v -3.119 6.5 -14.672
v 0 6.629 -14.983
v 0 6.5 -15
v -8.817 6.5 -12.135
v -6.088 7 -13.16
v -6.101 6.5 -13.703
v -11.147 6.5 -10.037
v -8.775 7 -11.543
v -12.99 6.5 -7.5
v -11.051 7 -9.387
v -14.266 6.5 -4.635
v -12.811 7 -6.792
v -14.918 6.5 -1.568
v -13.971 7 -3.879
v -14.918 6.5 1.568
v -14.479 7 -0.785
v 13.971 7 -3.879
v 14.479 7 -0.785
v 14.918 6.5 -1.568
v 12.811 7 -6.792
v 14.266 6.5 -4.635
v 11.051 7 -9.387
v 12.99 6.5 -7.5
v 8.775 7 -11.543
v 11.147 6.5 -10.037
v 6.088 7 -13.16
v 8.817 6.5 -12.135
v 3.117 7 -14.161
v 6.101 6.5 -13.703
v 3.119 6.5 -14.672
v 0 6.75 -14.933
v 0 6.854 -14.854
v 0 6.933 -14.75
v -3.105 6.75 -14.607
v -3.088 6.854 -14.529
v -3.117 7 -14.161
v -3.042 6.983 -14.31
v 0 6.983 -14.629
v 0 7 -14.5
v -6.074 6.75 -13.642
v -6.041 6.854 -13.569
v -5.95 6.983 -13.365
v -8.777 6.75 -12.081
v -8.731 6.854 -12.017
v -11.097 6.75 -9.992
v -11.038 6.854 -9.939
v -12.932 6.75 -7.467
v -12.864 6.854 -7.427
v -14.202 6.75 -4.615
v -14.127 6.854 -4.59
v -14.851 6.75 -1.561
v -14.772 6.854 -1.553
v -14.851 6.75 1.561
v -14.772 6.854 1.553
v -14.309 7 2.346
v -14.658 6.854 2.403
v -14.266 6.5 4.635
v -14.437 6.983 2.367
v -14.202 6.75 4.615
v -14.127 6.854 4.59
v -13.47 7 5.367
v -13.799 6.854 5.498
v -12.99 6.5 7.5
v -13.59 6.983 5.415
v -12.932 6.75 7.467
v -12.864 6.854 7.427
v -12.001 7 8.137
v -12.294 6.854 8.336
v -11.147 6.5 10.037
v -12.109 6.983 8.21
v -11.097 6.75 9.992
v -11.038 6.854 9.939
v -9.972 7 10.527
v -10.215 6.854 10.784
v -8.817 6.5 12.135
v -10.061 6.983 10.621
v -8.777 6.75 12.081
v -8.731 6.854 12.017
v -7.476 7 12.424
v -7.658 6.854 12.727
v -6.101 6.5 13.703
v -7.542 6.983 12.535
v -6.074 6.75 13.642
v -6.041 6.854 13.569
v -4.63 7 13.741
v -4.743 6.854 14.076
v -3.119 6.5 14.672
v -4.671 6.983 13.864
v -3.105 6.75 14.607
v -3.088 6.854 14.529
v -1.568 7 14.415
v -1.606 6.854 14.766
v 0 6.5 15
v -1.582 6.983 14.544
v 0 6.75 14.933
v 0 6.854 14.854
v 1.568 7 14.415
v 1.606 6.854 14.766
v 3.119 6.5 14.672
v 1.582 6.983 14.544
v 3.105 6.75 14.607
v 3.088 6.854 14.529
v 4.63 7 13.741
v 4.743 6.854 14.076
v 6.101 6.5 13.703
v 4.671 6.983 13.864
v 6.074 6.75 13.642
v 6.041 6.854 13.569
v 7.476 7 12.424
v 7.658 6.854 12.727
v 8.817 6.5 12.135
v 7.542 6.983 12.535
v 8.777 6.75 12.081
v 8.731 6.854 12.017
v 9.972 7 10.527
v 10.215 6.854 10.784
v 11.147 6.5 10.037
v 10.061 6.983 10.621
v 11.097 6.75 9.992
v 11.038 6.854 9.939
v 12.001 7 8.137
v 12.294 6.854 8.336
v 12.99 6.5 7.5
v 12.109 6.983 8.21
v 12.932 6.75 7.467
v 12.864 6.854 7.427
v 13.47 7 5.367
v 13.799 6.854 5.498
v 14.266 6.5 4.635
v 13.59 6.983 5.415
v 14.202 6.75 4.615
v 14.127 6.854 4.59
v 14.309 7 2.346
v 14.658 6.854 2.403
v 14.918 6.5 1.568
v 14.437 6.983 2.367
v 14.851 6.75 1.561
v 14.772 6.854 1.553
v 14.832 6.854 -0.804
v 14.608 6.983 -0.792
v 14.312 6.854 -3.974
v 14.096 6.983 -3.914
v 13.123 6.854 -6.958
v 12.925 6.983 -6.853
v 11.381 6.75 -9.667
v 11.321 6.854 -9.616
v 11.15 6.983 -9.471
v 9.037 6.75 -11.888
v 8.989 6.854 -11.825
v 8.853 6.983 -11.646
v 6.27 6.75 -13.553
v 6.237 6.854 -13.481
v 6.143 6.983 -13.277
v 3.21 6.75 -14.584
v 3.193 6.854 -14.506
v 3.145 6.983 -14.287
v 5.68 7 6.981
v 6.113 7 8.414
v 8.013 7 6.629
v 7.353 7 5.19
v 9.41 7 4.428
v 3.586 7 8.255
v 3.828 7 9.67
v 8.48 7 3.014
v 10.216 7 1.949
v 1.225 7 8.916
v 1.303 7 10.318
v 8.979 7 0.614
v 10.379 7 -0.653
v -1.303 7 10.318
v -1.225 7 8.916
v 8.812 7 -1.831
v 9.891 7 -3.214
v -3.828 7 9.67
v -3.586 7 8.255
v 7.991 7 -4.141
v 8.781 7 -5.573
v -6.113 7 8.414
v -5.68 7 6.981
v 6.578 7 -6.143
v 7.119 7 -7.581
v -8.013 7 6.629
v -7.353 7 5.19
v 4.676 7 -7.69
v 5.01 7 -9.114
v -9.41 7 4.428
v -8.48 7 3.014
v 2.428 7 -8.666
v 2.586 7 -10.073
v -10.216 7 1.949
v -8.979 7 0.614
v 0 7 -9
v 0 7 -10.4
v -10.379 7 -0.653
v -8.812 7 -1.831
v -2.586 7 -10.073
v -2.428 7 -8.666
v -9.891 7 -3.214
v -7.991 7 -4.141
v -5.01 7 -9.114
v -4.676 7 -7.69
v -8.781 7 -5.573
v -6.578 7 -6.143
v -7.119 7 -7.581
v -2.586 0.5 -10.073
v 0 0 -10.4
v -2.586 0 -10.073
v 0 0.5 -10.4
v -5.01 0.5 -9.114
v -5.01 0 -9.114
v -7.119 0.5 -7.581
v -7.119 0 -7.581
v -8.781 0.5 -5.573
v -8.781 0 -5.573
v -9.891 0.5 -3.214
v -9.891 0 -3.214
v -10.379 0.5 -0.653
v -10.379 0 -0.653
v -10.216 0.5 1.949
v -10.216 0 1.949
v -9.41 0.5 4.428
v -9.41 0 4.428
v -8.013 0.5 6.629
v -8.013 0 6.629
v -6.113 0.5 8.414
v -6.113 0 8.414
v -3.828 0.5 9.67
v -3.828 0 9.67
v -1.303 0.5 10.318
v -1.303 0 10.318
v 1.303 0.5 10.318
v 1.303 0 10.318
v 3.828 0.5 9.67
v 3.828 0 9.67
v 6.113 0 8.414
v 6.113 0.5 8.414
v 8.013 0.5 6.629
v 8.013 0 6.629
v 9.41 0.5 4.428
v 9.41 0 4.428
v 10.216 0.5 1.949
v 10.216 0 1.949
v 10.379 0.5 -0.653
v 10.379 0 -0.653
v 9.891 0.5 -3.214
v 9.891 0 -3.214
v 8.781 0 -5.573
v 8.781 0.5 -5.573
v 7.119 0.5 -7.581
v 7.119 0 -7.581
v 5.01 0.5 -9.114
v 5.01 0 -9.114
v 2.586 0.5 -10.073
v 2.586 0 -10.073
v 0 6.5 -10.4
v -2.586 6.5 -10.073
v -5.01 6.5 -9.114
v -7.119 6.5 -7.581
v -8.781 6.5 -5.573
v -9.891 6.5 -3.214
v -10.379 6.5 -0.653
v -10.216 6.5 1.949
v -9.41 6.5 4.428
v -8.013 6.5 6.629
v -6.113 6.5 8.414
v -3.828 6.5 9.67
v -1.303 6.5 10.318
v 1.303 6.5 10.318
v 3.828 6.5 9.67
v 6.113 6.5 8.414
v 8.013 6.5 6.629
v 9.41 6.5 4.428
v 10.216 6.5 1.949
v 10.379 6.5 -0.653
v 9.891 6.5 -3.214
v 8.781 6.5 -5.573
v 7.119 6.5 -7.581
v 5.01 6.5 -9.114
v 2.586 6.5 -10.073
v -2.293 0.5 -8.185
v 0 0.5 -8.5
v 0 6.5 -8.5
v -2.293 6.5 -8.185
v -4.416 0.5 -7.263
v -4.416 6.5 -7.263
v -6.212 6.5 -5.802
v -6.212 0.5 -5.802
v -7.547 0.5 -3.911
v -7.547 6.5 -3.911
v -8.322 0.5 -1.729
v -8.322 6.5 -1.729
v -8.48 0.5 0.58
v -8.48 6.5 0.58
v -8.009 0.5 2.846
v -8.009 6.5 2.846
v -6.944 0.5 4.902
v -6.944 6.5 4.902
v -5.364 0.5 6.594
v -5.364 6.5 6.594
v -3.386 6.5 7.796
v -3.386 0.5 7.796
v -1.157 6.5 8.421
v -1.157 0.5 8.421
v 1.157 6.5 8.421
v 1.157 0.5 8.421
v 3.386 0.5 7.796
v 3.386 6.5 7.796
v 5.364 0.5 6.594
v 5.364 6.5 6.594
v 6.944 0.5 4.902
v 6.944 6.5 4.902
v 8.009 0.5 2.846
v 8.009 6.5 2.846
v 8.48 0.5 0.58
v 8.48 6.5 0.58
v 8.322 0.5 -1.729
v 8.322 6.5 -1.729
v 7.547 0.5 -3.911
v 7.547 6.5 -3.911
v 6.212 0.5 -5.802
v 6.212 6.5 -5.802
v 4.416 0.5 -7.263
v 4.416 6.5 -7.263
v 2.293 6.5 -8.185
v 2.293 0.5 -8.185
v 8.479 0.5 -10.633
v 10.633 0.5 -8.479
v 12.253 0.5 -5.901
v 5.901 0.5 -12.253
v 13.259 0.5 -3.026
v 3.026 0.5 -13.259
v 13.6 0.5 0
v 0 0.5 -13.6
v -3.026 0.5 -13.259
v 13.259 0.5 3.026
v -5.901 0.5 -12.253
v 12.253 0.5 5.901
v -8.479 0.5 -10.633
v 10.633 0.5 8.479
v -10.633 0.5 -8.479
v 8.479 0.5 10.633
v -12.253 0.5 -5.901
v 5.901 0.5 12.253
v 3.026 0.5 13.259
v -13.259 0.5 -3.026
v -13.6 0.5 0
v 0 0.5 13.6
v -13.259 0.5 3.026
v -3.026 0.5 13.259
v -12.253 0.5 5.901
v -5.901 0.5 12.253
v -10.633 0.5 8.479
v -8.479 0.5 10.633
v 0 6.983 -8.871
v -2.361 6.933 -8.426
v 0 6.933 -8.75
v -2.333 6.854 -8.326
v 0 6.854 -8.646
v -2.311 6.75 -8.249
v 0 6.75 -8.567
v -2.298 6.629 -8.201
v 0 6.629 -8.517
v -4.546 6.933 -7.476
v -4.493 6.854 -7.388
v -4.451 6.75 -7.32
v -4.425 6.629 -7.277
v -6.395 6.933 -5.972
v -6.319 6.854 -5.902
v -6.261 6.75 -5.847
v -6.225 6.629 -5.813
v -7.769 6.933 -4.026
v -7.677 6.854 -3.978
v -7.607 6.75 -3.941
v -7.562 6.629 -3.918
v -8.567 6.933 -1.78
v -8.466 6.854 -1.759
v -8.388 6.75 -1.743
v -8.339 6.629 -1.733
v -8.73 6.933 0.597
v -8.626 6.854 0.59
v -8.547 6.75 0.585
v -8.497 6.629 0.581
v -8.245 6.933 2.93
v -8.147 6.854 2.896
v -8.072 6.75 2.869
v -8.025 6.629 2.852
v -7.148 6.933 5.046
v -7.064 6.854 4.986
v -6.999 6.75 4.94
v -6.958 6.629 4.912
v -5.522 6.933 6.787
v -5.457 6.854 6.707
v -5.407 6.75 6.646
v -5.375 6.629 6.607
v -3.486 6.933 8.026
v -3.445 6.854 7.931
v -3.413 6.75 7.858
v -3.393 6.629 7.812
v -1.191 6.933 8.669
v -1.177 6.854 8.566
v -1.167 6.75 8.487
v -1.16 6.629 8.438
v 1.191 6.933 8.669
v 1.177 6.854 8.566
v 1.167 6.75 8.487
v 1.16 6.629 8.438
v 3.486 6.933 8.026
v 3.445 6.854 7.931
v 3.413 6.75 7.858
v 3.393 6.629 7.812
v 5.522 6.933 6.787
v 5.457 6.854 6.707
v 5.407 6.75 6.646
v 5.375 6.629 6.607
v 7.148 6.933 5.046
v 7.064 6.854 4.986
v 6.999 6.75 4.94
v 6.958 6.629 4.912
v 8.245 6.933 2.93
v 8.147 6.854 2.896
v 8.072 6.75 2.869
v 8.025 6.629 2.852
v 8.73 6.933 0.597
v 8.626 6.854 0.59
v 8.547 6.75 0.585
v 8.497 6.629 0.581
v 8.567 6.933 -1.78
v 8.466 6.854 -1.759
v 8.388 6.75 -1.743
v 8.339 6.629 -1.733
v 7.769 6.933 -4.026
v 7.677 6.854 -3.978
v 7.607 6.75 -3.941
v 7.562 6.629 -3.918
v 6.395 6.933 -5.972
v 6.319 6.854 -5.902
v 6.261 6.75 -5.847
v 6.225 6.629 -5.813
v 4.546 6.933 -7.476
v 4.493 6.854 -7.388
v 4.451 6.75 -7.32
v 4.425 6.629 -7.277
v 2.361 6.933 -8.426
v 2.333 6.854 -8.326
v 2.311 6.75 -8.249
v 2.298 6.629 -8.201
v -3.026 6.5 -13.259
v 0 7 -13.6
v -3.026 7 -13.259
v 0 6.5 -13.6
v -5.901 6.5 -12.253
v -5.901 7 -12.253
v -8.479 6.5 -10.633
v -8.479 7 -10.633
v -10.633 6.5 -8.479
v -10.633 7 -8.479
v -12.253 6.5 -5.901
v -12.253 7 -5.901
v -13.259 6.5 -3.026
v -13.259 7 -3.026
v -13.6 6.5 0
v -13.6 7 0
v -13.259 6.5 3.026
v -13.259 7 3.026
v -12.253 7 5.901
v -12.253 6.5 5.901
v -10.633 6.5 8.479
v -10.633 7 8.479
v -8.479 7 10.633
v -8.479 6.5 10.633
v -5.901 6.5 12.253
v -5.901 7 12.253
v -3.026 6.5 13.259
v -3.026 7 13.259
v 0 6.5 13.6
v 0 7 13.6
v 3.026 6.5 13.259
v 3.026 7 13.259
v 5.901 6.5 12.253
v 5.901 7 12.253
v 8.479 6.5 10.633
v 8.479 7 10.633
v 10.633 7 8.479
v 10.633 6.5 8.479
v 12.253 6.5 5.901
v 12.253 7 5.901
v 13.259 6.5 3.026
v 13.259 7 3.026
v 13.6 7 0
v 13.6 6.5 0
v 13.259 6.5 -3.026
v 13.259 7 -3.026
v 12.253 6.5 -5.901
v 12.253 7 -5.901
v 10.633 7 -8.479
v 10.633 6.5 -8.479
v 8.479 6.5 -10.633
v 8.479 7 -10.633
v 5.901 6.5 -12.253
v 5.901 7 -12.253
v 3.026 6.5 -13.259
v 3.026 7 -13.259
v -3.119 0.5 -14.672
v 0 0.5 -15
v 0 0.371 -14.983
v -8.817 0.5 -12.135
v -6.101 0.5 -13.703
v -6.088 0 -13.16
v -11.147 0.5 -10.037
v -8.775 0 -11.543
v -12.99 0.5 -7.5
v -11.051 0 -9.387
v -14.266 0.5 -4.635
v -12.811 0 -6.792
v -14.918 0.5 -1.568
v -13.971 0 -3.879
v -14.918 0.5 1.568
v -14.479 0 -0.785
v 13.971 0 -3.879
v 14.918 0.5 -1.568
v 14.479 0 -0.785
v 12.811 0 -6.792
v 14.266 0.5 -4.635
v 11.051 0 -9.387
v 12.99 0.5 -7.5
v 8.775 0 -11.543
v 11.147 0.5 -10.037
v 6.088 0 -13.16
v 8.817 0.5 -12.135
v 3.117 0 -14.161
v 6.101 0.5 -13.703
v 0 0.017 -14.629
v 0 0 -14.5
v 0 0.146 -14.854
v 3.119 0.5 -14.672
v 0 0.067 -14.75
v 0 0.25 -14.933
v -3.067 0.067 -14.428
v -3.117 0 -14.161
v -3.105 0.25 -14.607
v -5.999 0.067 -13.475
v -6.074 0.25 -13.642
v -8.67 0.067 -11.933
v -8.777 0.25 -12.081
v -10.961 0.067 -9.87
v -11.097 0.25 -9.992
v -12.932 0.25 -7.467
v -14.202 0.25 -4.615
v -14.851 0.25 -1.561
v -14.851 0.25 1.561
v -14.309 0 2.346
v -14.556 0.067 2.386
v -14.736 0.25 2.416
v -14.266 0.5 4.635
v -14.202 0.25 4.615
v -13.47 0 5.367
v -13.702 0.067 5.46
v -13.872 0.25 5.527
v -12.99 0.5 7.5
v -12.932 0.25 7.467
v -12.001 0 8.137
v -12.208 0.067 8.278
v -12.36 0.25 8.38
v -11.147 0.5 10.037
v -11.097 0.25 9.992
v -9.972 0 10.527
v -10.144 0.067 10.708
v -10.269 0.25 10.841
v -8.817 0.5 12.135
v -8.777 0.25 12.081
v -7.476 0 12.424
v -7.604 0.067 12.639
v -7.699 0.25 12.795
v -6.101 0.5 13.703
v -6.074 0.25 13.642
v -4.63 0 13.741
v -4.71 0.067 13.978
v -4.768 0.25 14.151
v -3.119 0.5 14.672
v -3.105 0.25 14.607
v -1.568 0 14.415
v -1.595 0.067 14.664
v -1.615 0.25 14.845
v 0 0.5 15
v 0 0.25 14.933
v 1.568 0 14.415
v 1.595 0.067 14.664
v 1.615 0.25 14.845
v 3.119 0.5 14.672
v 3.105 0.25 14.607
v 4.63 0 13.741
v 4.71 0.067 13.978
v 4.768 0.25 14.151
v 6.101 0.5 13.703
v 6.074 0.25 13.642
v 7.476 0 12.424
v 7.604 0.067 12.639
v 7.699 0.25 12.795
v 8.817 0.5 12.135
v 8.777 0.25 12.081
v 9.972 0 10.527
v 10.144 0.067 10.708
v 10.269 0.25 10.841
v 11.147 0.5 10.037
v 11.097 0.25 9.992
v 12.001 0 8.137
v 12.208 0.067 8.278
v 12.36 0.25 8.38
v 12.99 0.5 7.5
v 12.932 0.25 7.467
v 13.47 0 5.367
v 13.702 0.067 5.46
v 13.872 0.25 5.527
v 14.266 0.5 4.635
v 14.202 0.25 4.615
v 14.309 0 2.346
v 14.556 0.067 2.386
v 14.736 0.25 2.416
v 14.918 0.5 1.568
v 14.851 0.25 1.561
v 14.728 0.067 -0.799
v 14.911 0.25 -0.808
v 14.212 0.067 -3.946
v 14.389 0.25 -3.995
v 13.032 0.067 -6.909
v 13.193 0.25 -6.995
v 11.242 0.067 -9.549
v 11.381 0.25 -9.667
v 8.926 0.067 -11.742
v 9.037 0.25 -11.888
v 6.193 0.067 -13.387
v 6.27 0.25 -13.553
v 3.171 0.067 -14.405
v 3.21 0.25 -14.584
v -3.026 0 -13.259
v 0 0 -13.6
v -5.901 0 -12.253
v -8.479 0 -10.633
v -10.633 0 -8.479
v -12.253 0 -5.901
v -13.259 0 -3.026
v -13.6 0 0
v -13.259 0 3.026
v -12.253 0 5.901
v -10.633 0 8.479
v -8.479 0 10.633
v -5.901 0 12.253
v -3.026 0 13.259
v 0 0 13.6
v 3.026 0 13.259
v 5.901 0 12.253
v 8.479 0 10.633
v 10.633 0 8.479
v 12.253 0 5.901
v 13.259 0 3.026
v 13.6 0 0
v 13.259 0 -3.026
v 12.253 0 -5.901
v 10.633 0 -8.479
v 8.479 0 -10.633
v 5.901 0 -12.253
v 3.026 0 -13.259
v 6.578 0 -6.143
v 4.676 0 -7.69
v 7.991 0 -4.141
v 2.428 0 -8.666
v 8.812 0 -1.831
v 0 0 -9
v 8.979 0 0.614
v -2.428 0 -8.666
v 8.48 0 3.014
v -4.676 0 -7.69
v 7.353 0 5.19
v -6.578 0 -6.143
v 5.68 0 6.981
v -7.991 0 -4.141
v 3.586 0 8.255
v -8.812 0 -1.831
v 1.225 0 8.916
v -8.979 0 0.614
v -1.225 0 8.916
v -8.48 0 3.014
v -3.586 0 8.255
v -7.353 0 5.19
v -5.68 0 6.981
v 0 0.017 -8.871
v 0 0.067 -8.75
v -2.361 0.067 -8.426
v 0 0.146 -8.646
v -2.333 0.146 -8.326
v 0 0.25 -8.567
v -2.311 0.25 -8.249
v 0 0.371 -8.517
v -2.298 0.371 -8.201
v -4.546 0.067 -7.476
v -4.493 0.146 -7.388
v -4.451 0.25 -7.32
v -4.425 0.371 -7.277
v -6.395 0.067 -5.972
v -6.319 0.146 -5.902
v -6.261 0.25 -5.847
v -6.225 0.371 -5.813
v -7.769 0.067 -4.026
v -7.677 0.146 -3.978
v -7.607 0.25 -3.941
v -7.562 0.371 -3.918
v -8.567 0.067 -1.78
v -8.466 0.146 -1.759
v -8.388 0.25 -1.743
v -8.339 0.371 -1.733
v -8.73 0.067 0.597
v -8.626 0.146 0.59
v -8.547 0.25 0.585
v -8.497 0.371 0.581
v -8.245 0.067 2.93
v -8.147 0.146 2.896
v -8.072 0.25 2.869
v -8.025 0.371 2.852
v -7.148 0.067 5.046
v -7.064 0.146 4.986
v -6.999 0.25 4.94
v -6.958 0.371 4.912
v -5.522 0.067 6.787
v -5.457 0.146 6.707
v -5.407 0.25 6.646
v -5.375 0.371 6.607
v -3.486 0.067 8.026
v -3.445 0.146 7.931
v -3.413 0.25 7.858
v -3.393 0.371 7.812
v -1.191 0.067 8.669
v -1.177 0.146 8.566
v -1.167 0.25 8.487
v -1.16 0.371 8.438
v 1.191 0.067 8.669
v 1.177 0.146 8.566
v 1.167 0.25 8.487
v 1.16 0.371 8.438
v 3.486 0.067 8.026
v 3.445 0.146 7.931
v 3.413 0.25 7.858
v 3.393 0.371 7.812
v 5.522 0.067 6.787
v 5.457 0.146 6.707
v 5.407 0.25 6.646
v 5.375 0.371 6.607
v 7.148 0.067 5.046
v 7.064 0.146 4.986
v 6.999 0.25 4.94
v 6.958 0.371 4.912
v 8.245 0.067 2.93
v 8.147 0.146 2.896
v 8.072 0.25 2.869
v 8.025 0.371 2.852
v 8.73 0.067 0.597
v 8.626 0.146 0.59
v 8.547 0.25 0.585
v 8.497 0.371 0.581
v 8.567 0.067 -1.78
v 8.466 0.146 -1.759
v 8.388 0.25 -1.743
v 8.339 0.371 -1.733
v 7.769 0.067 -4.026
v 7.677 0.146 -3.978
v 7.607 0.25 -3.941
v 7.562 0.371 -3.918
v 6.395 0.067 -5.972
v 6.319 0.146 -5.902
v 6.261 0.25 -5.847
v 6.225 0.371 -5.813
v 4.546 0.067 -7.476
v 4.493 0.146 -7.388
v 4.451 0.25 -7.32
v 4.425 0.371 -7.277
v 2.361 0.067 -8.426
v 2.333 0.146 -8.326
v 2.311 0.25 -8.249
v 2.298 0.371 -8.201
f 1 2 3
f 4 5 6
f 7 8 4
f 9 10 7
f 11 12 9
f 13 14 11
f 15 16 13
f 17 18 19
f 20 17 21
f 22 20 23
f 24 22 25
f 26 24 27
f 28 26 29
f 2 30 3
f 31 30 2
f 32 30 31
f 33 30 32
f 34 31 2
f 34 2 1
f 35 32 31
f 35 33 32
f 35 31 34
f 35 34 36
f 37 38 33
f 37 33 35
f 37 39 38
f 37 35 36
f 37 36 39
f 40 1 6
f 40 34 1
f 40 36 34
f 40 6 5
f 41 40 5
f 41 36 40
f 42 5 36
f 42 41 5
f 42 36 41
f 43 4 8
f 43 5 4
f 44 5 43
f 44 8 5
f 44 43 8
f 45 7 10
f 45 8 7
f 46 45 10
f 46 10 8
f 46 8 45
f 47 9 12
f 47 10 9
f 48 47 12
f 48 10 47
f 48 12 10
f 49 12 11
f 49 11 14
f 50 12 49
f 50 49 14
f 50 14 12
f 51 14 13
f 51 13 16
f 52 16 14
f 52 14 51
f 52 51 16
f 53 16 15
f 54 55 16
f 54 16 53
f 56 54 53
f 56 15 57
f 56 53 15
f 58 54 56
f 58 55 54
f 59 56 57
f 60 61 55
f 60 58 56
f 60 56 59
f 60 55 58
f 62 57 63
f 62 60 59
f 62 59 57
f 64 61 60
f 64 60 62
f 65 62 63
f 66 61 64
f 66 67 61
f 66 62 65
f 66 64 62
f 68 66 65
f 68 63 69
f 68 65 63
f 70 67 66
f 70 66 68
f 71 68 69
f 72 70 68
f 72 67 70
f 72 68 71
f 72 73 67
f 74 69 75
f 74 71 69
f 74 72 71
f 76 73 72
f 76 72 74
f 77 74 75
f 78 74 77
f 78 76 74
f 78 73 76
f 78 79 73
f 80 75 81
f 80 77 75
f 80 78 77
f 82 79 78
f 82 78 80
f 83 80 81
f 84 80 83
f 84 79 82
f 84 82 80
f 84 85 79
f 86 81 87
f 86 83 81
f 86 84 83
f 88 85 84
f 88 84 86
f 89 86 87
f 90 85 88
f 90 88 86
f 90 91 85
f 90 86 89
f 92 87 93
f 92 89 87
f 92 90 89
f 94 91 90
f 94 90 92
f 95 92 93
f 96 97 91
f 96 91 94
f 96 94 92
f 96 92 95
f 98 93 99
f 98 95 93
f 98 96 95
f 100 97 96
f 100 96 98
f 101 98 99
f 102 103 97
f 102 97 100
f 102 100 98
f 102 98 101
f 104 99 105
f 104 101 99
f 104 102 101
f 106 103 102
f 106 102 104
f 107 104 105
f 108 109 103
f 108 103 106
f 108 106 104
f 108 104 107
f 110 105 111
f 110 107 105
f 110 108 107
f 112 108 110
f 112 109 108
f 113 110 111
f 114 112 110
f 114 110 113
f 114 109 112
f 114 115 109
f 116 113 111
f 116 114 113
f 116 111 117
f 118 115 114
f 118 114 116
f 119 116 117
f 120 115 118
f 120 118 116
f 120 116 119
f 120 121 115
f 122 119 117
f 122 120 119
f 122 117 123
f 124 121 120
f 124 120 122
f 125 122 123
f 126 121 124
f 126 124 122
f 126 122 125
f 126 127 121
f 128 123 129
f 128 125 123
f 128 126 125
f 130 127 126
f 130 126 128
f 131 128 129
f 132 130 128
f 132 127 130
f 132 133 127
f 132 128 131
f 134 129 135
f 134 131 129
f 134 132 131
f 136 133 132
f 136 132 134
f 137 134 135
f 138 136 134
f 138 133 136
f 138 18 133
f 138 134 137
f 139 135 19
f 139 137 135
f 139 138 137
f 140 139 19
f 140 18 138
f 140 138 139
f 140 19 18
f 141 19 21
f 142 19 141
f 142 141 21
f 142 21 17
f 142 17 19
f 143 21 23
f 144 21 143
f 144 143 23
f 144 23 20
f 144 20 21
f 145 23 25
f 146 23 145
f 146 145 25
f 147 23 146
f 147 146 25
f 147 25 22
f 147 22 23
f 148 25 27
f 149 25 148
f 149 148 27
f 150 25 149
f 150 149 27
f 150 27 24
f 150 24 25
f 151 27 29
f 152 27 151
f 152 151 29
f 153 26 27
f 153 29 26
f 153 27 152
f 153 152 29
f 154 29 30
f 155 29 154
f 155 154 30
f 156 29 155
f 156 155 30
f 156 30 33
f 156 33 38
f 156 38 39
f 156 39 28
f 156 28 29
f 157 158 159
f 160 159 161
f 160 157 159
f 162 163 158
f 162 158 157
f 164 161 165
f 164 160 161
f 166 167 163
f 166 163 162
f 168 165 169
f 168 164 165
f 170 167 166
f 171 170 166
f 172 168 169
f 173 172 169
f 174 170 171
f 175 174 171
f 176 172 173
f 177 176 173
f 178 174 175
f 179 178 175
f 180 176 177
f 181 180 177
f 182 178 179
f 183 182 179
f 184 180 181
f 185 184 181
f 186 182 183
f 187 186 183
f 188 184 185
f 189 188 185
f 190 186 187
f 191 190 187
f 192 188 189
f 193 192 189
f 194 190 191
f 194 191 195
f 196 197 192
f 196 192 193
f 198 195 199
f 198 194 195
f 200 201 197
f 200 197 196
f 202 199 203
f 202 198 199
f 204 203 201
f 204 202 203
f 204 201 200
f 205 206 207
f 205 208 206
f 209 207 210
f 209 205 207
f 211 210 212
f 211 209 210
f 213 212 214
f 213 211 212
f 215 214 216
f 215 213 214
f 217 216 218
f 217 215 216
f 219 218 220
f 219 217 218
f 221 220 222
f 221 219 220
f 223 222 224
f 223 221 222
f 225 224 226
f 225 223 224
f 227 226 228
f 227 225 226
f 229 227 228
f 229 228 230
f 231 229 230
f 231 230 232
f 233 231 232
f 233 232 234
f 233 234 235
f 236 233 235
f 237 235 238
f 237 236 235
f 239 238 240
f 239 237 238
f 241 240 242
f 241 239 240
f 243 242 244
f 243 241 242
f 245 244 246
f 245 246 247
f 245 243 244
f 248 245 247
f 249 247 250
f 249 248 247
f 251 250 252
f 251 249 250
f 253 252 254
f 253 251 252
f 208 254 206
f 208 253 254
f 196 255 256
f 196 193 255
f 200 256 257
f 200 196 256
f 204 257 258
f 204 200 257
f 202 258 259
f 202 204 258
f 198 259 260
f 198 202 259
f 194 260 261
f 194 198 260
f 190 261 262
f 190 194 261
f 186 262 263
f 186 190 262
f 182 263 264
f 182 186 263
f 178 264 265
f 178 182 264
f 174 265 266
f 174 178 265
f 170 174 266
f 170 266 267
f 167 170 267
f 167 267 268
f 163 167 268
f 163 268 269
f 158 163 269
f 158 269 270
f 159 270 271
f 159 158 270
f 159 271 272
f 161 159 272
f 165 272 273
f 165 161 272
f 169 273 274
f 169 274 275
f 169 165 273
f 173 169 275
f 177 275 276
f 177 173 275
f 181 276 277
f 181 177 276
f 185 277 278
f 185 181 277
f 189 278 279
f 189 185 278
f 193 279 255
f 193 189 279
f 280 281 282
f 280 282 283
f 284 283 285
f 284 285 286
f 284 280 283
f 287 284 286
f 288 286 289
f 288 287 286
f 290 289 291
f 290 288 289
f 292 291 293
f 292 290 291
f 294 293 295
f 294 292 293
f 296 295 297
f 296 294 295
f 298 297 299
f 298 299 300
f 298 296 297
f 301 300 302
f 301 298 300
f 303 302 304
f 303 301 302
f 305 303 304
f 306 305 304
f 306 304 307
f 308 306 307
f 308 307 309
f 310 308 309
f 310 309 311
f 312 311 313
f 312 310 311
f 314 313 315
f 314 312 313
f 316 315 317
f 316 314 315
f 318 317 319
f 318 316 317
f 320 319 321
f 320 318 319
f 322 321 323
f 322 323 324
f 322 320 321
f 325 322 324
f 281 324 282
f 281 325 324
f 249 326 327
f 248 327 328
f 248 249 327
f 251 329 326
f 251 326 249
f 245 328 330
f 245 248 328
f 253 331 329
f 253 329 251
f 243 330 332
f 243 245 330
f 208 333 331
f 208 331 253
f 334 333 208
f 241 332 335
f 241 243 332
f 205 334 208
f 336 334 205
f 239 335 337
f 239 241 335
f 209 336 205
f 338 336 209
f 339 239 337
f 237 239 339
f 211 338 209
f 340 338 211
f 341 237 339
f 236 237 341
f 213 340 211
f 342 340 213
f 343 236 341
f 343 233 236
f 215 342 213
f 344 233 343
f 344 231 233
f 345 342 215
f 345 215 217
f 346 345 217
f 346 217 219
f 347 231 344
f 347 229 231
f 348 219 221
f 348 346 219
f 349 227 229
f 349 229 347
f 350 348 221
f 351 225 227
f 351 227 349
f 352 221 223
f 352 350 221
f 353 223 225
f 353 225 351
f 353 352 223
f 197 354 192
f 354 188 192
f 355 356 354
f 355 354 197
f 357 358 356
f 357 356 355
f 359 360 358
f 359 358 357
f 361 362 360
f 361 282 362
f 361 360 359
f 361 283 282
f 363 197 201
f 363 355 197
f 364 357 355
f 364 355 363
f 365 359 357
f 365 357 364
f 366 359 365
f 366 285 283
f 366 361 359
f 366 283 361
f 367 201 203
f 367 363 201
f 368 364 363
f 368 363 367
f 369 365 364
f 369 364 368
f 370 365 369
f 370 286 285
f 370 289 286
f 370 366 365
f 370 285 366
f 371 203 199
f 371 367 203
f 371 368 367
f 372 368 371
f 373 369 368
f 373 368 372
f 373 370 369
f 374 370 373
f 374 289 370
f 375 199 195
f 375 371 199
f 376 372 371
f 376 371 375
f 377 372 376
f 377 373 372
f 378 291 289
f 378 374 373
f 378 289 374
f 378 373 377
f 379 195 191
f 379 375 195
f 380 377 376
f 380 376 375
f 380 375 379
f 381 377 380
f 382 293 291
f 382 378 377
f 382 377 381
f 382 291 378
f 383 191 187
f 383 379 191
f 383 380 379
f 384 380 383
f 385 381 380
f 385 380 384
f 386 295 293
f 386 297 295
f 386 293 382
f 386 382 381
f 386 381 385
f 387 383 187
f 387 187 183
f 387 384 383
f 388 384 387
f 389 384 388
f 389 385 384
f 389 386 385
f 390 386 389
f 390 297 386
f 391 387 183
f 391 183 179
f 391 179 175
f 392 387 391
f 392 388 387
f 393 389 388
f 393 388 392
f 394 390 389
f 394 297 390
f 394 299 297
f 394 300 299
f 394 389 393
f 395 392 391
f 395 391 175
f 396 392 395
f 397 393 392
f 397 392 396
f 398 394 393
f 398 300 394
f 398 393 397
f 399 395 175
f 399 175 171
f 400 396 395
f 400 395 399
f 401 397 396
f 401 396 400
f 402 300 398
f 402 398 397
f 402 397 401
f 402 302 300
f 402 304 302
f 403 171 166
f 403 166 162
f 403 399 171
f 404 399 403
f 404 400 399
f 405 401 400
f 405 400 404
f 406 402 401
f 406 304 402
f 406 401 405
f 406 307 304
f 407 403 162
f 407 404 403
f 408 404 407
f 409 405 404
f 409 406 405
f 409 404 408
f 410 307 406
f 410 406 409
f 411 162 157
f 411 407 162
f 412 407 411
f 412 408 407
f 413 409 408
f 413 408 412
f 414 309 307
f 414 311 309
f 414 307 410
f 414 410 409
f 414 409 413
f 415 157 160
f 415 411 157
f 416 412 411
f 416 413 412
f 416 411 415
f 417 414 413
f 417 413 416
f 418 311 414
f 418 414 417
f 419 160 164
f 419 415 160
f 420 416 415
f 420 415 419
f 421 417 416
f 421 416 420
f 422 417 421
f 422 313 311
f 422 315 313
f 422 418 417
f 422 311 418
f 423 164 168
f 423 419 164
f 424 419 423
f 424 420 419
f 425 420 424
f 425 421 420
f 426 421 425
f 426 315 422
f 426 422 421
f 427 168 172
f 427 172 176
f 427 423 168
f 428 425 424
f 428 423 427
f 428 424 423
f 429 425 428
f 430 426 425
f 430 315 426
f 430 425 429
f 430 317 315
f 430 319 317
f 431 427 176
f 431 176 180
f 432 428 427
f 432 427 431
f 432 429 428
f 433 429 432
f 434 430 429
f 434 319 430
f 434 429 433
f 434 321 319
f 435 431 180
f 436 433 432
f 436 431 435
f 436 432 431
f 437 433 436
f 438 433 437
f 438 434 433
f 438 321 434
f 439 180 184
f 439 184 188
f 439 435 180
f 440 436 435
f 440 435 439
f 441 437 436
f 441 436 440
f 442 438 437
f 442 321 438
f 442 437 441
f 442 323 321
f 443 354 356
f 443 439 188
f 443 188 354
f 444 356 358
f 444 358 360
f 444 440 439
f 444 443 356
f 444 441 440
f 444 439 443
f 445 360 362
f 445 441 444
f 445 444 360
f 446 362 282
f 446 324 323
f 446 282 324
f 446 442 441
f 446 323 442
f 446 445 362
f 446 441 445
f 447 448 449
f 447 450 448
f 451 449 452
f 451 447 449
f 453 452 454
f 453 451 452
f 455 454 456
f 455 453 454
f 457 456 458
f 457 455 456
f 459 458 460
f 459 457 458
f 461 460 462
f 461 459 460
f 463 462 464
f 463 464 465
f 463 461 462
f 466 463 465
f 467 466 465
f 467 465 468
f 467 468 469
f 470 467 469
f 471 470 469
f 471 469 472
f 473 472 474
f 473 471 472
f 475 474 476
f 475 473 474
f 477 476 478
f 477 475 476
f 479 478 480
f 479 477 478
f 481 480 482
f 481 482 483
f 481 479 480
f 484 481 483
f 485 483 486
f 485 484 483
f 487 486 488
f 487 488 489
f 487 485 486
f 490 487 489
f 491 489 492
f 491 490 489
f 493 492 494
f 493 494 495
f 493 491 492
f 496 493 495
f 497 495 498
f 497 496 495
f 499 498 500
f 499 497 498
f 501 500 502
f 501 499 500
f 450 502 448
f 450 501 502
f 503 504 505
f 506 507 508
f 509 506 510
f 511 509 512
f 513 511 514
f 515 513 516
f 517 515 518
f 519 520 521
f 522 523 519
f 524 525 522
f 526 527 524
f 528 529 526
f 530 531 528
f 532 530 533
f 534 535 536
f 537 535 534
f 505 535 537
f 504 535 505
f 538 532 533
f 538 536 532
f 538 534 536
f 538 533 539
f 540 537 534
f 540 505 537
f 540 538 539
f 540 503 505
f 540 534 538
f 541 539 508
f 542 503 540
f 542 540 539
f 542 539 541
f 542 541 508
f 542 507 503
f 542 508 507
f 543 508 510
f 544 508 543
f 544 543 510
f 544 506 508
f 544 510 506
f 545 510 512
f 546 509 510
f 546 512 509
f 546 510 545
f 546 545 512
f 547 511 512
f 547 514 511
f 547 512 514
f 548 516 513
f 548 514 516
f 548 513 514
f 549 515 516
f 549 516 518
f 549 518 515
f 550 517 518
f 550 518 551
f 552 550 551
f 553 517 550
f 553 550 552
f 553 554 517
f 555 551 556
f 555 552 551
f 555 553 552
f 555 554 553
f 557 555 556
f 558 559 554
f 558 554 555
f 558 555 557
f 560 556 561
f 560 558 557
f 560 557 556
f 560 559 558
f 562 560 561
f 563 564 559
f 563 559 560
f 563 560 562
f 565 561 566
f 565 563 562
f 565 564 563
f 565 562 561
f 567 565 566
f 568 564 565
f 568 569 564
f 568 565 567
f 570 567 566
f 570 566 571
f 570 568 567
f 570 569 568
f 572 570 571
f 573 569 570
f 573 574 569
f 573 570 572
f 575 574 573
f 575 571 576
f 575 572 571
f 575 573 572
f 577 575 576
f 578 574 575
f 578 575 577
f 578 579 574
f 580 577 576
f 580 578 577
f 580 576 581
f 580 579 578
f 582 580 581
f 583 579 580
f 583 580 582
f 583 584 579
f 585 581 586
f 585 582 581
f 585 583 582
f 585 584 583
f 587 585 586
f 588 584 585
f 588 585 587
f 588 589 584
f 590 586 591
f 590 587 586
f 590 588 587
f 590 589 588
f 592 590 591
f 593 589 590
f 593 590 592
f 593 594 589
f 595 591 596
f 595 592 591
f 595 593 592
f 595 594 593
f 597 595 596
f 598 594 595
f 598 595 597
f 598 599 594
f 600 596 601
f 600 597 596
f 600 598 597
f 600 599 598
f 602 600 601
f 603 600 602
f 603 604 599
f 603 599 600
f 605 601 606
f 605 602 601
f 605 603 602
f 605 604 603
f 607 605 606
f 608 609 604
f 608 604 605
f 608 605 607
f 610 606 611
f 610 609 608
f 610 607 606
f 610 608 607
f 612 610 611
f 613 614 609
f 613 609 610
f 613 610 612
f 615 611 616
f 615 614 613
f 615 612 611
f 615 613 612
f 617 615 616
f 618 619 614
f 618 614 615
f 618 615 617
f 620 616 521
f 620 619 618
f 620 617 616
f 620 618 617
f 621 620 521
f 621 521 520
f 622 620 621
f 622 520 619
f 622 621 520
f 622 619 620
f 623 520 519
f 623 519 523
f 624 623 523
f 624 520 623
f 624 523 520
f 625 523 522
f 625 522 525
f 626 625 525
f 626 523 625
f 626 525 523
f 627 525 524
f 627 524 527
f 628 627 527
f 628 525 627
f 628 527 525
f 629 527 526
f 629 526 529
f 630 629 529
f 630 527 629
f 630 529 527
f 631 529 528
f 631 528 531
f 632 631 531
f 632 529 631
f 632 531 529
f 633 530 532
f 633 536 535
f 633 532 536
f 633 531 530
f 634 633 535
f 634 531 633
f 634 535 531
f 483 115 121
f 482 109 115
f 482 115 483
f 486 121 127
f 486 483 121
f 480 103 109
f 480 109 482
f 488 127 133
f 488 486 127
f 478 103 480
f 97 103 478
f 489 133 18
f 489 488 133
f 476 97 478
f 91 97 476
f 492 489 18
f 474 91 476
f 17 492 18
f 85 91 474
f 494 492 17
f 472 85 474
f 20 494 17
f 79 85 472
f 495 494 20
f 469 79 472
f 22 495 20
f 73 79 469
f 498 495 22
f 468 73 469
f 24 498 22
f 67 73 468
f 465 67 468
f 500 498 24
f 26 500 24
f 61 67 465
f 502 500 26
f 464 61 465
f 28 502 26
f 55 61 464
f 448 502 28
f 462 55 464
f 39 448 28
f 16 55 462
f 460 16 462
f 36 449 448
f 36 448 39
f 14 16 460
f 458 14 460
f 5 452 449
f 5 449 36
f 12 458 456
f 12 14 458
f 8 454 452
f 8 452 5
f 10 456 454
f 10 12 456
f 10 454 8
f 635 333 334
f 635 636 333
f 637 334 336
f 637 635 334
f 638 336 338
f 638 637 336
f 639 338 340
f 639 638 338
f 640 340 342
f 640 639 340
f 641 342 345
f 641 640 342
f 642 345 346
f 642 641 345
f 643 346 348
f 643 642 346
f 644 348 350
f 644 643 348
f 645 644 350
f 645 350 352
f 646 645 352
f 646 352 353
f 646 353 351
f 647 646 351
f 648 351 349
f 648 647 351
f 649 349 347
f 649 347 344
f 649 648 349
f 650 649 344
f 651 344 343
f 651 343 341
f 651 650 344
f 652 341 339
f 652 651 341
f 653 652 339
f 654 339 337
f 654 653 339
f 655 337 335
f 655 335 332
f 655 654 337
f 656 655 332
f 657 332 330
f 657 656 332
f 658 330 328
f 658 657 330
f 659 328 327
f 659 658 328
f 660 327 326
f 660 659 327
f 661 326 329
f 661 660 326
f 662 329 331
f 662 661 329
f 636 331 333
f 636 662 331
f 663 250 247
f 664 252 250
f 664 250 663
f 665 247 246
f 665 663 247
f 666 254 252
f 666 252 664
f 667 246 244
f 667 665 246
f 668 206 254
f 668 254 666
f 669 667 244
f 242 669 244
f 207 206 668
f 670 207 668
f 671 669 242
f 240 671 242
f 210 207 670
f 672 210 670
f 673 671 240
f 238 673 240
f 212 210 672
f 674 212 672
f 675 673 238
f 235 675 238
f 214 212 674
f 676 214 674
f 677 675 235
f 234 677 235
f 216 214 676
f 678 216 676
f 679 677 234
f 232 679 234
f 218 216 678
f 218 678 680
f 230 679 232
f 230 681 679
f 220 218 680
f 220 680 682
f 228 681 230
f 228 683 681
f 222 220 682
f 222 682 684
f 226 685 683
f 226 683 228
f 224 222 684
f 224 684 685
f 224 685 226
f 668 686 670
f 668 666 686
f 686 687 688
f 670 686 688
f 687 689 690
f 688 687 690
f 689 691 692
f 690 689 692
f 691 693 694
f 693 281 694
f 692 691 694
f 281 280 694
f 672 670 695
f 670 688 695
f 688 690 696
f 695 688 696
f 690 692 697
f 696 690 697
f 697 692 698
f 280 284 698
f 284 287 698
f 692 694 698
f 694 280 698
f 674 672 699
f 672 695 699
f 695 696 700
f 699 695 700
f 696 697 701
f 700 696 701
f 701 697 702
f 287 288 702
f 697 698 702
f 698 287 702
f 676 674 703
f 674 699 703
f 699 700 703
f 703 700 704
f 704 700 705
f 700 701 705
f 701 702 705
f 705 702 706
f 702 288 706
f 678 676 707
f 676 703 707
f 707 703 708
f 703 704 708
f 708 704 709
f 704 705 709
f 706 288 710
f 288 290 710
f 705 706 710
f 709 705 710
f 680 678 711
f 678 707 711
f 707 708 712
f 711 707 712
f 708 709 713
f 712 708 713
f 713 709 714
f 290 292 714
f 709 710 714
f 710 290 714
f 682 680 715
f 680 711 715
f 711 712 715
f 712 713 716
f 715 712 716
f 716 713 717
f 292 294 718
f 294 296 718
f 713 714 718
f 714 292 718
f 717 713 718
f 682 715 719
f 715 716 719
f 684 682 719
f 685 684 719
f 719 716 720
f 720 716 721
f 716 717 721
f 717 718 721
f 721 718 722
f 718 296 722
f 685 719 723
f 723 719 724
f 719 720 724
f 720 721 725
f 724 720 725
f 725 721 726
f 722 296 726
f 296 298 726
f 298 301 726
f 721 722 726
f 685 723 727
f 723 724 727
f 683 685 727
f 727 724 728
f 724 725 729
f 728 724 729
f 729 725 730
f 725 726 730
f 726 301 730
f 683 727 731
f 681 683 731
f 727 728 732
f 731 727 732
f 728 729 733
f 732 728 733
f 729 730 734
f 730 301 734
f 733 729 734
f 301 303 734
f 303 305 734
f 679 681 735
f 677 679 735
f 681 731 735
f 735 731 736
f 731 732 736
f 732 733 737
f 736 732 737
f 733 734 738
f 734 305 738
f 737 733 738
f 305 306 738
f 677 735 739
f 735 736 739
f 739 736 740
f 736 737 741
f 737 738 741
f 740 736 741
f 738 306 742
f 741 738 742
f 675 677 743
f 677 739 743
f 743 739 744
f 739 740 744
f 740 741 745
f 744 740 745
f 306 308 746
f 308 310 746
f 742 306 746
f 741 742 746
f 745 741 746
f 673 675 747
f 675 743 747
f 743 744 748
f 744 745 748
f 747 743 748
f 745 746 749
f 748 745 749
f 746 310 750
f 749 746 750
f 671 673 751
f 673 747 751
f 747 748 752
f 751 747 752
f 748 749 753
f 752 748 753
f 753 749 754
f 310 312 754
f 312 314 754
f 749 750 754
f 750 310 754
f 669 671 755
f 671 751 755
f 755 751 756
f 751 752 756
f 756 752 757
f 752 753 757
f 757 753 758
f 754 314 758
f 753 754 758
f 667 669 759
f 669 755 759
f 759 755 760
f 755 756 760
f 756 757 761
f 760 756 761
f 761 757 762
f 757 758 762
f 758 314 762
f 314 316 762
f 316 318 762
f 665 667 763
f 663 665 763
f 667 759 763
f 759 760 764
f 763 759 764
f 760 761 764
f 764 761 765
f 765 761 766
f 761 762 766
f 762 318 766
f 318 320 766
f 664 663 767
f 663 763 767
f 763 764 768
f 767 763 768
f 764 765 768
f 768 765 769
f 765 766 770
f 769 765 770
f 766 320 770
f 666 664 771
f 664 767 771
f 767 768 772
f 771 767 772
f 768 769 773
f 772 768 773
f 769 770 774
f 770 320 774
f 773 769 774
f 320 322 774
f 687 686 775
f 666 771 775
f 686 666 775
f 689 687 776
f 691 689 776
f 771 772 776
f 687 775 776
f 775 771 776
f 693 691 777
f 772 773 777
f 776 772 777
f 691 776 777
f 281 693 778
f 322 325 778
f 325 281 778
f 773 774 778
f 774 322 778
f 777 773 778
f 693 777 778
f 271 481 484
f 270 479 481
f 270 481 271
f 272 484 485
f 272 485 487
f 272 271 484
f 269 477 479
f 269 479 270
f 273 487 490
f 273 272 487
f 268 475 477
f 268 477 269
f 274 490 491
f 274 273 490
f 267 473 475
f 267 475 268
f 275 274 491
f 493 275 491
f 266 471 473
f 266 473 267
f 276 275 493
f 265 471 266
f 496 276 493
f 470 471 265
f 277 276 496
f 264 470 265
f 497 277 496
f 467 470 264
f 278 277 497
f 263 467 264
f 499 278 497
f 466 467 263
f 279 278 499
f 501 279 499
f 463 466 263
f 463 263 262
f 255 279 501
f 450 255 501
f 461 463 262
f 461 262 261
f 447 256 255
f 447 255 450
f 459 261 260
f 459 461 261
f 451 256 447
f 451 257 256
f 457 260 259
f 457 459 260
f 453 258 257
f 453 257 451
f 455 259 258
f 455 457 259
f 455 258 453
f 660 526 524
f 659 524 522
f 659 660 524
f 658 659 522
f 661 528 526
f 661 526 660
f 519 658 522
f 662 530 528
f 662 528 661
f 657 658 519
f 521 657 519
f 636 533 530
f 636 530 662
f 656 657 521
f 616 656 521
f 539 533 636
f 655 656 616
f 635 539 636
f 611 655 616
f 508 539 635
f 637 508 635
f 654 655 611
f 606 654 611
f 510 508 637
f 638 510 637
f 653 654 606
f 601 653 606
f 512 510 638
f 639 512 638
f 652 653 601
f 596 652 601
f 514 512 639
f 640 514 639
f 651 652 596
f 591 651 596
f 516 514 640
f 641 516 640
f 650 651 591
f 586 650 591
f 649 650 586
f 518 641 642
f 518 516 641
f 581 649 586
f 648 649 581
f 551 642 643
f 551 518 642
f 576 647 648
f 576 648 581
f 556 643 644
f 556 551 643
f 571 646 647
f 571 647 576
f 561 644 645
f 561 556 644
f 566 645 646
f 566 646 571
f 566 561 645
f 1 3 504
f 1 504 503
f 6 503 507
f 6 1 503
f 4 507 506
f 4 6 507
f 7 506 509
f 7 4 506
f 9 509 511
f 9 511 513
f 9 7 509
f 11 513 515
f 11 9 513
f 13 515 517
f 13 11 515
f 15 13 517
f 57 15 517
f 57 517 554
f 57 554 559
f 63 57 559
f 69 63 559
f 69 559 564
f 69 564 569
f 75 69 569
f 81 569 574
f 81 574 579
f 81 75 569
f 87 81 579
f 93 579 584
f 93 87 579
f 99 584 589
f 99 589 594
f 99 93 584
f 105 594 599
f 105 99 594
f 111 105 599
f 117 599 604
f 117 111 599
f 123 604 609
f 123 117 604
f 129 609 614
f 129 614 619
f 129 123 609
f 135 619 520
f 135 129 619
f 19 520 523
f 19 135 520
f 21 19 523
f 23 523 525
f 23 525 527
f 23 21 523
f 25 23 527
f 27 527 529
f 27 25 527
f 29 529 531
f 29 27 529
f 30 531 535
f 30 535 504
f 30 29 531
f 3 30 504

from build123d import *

# Parameters (mm, degrees)
VERRUNDUNG1_R = 0.5


with BuildPart() as part:
    # Skizze1 → Rotation1 (revolve)
    with BuildSketch(Plane.XY, mode=Mode.PRIVATE) as rotation1_sk:
        Polygon((8.5, 0), (10.4, 0), (10.4, 0.5), (13.6, 0.5), (13.6, 0), (15, 0), (15, 7), (13.6, 7), (13.6, 6.5), (10.4, 6.5), (10.4, 7), (8.5, 7), align=None)
    revolve(rotation1_sk.sketch.rotate(Axis((0, 0, 0), (0, 1, 0)), 90), axis=Axis((0, 0, 0), (0, 1, 0)))

    # Verrundung1
    verrundung1_edges = [part.edges().sort_by_distance(p)[0] for p in [
        (0, 7, 15),
        (0, 0, 15),
        (0, 0, 8.5),
        (0, 7, 8.5),
    ]]
    fillet(verrundung1_edges, radius=VERRUNDUNG1_R)


solid = part.part
